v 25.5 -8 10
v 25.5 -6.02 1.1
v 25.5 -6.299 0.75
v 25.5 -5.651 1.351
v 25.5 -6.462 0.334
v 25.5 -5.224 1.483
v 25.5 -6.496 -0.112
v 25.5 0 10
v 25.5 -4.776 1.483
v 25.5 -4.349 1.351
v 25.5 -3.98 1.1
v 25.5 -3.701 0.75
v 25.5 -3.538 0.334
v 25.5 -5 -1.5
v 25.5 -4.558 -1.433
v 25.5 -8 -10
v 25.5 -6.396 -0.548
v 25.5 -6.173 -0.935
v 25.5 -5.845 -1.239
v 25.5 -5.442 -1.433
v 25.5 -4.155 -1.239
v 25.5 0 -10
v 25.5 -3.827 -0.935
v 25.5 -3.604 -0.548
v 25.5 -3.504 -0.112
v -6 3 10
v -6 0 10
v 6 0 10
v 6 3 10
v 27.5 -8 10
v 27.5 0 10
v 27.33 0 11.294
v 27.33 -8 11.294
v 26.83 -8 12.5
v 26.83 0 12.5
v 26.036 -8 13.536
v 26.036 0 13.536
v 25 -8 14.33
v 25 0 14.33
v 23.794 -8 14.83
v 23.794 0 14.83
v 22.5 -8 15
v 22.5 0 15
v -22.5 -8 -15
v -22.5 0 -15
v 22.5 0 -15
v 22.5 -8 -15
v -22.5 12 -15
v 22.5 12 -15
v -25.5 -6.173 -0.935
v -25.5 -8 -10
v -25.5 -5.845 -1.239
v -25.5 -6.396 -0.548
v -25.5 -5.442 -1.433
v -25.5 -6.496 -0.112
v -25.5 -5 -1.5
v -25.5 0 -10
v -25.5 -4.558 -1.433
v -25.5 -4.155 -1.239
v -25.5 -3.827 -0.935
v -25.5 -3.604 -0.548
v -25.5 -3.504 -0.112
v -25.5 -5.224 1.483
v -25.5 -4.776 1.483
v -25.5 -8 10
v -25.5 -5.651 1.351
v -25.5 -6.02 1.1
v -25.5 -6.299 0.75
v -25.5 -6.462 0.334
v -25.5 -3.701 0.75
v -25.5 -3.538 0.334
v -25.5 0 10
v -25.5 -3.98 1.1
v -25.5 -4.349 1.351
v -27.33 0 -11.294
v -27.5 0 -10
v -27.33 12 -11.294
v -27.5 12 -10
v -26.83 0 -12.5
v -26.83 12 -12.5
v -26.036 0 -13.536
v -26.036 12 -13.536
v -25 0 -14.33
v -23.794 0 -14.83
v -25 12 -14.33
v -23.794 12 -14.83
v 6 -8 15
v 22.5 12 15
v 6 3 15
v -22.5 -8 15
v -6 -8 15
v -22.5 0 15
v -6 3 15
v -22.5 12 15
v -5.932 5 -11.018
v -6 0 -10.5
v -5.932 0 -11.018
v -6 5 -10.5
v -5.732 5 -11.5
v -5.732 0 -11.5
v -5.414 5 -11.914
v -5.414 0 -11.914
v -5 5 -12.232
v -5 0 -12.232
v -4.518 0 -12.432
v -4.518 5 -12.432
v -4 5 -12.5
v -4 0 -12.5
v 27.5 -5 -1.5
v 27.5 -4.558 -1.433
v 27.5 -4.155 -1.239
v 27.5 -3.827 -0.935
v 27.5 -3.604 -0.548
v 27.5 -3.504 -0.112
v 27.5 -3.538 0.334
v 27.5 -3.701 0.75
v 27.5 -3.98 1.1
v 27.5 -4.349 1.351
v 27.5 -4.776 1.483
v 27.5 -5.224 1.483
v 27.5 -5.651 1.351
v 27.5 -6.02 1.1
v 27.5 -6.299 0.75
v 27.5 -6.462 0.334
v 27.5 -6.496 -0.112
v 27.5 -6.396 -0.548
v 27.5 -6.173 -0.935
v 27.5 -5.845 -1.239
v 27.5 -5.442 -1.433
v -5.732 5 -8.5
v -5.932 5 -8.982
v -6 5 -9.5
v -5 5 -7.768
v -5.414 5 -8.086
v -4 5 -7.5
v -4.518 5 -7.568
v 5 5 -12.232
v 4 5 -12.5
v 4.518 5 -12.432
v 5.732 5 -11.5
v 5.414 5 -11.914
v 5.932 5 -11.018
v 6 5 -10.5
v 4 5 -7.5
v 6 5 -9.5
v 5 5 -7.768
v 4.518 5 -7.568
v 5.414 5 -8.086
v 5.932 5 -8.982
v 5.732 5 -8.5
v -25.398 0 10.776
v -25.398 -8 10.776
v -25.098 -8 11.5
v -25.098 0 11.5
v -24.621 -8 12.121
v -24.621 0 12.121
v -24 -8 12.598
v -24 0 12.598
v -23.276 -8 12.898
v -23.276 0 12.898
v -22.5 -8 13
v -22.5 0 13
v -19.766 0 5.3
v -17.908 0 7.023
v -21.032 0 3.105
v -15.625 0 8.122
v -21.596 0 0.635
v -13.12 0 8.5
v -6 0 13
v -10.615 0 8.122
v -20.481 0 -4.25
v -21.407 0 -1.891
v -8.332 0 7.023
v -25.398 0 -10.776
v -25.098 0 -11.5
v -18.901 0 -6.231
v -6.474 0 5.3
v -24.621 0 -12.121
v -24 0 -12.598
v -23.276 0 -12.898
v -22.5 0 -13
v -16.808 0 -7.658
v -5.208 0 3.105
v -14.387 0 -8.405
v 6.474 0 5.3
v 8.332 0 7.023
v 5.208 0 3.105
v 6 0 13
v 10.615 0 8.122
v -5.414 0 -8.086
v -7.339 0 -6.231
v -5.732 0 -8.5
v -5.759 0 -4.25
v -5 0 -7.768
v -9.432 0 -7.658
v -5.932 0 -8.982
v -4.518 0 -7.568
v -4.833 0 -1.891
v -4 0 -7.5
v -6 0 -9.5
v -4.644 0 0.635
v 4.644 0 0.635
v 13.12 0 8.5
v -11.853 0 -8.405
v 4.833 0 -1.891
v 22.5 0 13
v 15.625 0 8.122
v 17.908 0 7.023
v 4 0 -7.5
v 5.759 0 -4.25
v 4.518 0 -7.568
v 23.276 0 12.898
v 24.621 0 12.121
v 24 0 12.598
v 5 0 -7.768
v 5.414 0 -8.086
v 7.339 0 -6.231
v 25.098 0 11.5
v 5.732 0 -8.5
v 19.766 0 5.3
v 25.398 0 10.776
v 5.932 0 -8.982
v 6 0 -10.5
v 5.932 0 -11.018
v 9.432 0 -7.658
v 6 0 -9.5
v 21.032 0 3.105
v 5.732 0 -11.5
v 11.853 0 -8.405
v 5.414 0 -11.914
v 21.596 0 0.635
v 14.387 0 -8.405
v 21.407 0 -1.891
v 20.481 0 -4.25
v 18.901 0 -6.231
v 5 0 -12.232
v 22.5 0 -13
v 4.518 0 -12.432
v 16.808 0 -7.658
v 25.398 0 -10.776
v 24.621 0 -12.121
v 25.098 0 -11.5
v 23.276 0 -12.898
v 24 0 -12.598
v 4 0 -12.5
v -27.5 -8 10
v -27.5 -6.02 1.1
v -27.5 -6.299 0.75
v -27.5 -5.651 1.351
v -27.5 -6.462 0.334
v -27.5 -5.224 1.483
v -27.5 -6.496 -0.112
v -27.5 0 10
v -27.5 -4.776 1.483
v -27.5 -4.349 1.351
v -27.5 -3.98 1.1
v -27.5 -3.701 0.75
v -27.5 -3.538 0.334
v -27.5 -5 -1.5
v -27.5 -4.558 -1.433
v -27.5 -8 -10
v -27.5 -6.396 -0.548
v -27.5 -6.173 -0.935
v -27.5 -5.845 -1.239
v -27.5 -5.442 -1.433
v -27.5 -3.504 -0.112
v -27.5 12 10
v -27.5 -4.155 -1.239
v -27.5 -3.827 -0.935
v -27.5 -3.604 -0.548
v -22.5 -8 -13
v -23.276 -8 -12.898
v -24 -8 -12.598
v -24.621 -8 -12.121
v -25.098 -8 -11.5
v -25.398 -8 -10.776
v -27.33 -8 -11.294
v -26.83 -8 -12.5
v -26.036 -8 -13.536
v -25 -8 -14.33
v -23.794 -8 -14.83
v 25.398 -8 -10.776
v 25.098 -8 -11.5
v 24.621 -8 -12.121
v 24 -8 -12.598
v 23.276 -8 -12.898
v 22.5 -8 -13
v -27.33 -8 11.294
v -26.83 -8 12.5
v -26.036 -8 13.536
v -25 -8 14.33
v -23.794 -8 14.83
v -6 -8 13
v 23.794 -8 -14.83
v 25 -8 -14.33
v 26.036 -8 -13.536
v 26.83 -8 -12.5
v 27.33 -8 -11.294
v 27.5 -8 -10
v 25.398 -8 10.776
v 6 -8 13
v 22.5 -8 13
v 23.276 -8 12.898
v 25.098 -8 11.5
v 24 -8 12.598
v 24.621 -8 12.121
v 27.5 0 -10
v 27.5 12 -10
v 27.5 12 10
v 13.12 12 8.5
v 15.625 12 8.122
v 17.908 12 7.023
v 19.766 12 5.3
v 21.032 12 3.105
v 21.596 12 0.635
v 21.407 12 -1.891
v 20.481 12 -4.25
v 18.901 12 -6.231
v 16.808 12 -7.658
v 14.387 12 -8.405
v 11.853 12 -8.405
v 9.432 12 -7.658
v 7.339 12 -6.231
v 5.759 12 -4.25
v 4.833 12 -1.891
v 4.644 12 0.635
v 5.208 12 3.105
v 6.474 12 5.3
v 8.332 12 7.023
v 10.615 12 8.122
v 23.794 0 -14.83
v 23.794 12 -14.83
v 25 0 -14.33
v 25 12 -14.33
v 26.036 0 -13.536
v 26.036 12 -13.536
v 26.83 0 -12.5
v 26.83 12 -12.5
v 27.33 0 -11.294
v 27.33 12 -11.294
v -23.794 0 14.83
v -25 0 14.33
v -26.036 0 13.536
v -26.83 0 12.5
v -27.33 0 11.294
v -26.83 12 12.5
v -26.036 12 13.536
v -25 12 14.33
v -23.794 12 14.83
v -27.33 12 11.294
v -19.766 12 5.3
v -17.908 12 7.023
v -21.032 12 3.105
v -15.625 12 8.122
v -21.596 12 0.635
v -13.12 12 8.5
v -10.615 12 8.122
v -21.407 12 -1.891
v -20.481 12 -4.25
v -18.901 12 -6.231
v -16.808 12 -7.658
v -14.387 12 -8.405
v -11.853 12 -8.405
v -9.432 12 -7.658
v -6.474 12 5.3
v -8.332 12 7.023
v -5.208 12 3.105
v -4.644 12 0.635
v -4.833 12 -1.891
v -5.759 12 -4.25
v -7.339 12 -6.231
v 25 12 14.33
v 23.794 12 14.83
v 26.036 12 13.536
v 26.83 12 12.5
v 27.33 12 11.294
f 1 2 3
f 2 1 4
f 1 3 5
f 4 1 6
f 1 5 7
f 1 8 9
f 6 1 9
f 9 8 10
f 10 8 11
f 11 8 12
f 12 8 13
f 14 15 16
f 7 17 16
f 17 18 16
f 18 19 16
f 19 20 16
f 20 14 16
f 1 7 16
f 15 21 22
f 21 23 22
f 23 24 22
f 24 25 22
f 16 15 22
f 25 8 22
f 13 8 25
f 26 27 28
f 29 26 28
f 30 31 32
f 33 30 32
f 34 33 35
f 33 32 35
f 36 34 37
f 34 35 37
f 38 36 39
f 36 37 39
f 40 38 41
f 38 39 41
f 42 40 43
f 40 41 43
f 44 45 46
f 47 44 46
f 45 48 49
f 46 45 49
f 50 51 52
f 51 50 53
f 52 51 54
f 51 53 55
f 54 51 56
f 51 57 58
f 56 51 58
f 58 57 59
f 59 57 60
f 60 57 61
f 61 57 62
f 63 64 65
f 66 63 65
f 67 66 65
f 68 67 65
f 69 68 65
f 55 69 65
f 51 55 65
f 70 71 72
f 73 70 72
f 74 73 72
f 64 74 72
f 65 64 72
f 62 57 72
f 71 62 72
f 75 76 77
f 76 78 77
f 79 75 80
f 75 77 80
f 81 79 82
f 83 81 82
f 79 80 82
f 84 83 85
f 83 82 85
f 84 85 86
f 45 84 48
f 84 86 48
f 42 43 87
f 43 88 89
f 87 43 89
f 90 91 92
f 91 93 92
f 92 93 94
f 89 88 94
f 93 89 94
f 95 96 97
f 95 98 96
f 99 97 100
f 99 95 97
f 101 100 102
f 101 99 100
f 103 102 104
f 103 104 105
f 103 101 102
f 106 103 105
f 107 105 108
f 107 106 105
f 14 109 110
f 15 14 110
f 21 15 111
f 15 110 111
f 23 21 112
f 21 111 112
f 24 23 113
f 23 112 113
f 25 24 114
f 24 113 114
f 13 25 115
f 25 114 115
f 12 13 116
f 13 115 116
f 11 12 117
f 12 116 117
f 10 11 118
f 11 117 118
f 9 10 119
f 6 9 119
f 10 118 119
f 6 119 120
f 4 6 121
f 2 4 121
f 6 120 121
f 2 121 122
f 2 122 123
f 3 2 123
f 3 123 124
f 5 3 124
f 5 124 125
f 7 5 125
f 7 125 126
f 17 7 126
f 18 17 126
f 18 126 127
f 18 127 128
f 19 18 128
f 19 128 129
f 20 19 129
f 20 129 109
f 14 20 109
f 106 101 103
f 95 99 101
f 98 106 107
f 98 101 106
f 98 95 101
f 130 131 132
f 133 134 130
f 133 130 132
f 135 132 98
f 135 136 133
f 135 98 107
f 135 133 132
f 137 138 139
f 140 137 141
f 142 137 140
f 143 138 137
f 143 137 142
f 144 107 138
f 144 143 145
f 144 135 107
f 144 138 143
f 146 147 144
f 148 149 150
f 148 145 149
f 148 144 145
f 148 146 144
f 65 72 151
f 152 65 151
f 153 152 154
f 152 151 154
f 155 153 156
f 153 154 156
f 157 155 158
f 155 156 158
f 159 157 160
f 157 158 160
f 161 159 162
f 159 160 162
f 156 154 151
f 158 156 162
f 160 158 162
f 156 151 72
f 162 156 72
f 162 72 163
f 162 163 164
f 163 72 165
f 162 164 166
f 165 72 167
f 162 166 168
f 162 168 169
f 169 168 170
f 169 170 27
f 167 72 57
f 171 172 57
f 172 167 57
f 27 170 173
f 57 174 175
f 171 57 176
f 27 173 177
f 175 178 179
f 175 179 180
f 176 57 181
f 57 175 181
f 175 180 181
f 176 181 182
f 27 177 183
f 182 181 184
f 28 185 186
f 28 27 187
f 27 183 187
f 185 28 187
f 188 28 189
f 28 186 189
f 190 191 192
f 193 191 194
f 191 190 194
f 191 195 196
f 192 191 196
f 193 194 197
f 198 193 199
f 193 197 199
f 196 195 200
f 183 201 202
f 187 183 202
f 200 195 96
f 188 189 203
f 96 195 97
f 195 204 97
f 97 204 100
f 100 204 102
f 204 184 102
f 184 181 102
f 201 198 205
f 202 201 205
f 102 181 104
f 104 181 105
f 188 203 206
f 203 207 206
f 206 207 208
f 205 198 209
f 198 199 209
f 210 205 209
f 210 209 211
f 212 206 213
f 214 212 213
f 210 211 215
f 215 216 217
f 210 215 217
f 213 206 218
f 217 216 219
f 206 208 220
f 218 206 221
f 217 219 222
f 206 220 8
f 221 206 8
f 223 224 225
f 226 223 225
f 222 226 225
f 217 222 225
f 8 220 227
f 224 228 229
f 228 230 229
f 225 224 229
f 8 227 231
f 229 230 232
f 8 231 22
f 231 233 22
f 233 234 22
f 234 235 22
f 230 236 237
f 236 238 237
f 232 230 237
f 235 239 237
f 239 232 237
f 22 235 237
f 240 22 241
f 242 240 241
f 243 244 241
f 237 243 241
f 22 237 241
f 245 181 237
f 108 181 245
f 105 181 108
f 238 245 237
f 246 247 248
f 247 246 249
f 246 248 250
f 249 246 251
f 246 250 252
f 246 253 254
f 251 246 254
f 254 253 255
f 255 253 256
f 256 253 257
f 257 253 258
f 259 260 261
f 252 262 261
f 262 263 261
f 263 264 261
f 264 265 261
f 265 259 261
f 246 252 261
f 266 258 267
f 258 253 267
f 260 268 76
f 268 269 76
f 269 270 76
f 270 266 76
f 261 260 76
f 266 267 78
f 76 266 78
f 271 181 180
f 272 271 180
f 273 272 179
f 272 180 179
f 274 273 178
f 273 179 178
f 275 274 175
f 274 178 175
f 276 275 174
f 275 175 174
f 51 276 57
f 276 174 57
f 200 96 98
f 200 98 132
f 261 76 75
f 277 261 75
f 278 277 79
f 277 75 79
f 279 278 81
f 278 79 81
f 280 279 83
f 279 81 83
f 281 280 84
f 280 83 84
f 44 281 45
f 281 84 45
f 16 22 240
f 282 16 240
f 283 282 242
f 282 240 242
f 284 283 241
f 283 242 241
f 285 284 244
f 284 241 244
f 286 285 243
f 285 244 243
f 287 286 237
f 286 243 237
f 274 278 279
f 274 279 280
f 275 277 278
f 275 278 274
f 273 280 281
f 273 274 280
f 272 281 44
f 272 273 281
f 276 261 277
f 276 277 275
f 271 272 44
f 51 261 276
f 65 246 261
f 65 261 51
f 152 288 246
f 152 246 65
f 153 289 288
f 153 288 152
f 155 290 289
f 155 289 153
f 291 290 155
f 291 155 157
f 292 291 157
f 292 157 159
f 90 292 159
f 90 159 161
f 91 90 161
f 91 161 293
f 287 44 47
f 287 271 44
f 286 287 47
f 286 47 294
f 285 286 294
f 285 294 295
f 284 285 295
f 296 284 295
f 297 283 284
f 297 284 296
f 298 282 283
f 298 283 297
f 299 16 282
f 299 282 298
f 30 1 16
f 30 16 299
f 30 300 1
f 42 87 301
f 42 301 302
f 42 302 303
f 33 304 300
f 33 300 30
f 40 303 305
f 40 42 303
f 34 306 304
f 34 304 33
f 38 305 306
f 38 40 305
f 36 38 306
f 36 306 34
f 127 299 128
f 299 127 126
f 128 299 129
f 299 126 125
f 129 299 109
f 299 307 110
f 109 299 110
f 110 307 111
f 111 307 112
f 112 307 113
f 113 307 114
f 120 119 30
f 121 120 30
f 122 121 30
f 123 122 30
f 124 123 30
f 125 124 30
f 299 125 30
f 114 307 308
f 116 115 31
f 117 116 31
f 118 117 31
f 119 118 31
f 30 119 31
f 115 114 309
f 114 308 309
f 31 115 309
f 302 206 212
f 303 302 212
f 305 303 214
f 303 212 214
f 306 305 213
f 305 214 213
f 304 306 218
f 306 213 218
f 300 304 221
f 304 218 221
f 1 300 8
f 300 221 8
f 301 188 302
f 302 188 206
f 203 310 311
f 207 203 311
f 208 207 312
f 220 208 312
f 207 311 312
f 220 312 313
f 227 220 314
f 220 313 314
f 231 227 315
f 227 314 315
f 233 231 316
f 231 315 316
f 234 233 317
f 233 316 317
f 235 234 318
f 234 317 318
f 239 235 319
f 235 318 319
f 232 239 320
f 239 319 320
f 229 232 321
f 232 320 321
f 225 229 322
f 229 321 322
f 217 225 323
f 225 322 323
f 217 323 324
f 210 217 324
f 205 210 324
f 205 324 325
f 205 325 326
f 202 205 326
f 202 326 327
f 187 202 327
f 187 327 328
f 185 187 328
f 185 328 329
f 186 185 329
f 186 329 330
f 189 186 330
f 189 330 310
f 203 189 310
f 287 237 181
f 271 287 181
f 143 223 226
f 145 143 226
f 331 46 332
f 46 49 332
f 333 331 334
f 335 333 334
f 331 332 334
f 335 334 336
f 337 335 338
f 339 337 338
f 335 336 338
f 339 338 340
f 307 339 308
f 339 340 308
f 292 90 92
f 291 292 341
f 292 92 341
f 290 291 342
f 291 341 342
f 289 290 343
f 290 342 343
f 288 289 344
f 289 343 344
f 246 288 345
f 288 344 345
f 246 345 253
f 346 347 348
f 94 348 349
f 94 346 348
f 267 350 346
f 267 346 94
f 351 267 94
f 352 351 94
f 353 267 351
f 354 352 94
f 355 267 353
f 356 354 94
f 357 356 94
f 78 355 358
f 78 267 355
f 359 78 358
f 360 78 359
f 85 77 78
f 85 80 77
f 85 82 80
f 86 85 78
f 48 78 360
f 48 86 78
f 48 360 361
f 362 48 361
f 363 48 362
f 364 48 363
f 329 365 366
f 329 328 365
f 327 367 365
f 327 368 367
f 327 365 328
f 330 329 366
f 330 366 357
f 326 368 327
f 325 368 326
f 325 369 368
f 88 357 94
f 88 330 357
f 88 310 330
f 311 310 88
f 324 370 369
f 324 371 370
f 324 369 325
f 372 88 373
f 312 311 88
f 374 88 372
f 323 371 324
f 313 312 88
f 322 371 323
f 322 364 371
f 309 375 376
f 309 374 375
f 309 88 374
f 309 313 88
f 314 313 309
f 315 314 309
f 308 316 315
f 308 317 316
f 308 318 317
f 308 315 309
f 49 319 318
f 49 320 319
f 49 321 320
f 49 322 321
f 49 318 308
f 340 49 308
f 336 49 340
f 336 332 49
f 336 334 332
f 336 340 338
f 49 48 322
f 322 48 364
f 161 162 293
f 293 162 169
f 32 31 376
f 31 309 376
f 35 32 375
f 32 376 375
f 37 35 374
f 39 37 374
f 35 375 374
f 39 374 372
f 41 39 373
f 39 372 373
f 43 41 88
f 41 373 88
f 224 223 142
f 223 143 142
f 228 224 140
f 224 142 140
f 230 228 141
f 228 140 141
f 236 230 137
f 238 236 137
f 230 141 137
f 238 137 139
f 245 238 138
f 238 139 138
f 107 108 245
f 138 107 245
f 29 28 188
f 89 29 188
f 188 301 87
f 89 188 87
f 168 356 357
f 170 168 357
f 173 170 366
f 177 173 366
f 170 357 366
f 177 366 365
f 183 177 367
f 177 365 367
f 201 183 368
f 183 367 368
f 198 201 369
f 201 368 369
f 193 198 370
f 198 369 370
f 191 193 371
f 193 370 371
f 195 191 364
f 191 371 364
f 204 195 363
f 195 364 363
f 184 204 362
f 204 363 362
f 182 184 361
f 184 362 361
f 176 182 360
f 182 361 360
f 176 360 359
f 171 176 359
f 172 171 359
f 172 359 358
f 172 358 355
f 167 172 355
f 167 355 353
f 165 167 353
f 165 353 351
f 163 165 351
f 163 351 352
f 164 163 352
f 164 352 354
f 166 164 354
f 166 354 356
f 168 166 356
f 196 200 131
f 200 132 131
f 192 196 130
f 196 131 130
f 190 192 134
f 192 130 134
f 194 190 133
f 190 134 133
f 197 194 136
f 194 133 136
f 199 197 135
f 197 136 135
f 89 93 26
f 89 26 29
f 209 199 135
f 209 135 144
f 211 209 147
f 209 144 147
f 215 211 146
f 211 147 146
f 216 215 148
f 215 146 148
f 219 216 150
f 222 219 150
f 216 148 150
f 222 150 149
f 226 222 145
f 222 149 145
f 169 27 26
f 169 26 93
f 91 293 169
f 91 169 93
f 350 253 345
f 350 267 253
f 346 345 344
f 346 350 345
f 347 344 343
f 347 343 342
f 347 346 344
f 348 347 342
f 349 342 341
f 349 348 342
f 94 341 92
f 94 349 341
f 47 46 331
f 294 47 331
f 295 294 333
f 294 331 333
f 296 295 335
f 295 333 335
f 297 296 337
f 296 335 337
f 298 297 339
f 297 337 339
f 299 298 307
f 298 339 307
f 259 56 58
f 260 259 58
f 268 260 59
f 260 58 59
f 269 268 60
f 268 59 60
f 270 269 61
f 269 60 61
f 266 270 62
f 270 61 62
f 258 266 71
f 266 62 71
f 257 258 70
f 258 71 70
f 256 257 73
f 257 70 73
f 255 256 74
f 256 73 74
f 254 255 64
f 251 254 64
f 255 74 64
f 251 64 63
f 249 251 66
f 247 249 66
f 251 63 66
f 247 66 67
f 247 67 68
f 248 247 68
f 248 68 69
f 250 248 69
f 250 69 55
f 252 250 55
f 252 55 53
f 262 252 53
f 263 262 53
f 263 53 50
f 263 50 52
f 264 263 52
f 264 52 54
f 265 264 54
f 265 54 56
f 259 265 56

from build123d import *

# Parameters (mm, degrees)
SKETCH1_W             = 55
SKETCH1_H             = 30
BOSS_EXTRUDE1_DEPTH   = 12
SKETCH2_R             = 8.5
CUT_EXTRUDE1_DEPTH    = 34.544746235
SKETCH4_W             = 12
SKETCH4_H             = 5
CUT_EXTRUDE2_DEPTH    = 5
FILLET1_R             = 2
SKETCH5_W             = 12
SKETCH5_H             = 5
CUT_EXTRUDE3_DEPTH    = 3
FILLET2_R             = 5
BOSS_EXTRUDE3_DEPTH   = 8
F_3_0MM_DOWEL_HOLE1_D = 3


with BuildPart() as part:
    # Sketch1 → Boss-Extrude1 (new body)
    with BuildSketch(Plane(origin=(0, 0, 0), x_dir=(1, 0, 0), z_dir=(0, 1, 0))):
        Rectangle(SKETCH1_W, SKETCH1_H)
    extrude(amount=BOSS_EXTRUDE1_DEPTH)

    # Sketch2 → Cut-Extrude1 (cut, through all)
    with BuildSketch(Plane(origin=(0, 12, 0), x_dir=(1, 0, 0), z_dir=(0, 1, 0))):
        with Locations(Location((-13.12, 0, 0), (0, 0, 270))):
            Circle(SKETCH2_R)
        with Locations(Location((13.12, 0, 0), (0, 0, 270))):
            Circle(SKETCH2_R)
    extrude(amount=-CUT_EXTRUDE1_DEPTH, mode=Mode.SUBTRACT)

    # Sketch4 → Cut-Extrude2 (cut)
    with BuildSketch(Plane.XZ):
        with Locations((0, -10)):
            Rectangle(SKETCH4_W, SKETCH4_H)
    extrude(amount=-CUT_EXTRUDE2_DEPTH, mode=Mode.SUBTRACT)

    # Fillet1
    fillet1_edges = [part.edges().sort_by_distance(p)[0] for p in [
        (-6, 2.5, -12.5),
        (-6, 2.5, -7.5),
        (6, 2.5, -7.5),
        (6, 2.5, -12.5),
    ]]
    fillet(fillet1_edges, radius=FILLET1_R)

    # Sketch5 → Cut-Extrude3 (cut)
    with BuildSketch(Plane.XZ):
        with Locations((0, 12.5)):
            Rectangle(SKETCH5_W, SKETCH5_H)
    extrude(amount=-CUT_EXTRUDE3_DEPTH, mode=Mode.SUBTRACT)

    # Fillet2
    fillet2_edges = [part.edges().sort_by_distance(p)[0] for p in [
        (27.5, 6, 15),
        (-27.5, 6, 15),
        (-27.5, 6, -15),
        (27.5, 6, -15),
    ]]
    fillet(fillet2_edges, radius=FILLET2_R)

    # Sketch6 → Boss-Extrude3 (add)
    with BuildSketch(Plane.XZ):
        with BuildLine():
            Line((25.5, 10), (25.5, -10))
            ThreePointArc((25.5, -10), (24.621320344, -12.121320344), (22.5, -13))
            Line((22.5, -13), (-22.5, -13))
            ThreePointArc((-22.5, -13), (-24.621320344, -12.121320344), (-25.5, -10))
            Line((-25.5, -10), (-25.5, 10))
            ThreePointArc((-25.5, 10), (-24.621320344, 12.121320344), (-22.5, 13))
            Line((-22.5, 13), (-8, 13))
            Line((-8, 13), (-6, 13))
            Line((-6, 13), (-6, 15))
            Line((-6, 15), (-22.5, 15))
            ThreePointArc((-22.5, 15), (-26.035533906, 13.535533906), (-27.5, 10))
            Line((-27.5, 10), (-27.5, -10))
            ThreePointArc((-27.5, -10), (-26.035533906, -13.535533906), (-22.5, -15))
            Line((-22.5, -15), (22.5, -15))
            ThreePointArc((22.5, -15), (26.035533906, -13.535533906), (27.5, -10))
            Line((27.5, -10), (27.5, 10))
            ThreePointArc((27.5, 10), (26.035533906, 13.535533906), (22.5, 15))
            Line((22.5, 15), (6, 15))
            Line((6, 15), (6, 13))
            Line((6, 13), (8, 13))
            Line((8, 13), (22.5, 13))
            ThreePointArc((22.5, 13), (24.621320344, 12.121320344), (25.5, 10))
        make_face()
    extrude(amount=BOSS_EXTRUDE3_DEPTH)

    # Ø3.0mm Dowel Hole1 (through all)
    with Locations(Plane.ZY.offset(27.5)):
        with Locations((0, -5)):
            Hole(F_3_0MM_DOWEL_HOLE1_D / 2)


solid = part.part
